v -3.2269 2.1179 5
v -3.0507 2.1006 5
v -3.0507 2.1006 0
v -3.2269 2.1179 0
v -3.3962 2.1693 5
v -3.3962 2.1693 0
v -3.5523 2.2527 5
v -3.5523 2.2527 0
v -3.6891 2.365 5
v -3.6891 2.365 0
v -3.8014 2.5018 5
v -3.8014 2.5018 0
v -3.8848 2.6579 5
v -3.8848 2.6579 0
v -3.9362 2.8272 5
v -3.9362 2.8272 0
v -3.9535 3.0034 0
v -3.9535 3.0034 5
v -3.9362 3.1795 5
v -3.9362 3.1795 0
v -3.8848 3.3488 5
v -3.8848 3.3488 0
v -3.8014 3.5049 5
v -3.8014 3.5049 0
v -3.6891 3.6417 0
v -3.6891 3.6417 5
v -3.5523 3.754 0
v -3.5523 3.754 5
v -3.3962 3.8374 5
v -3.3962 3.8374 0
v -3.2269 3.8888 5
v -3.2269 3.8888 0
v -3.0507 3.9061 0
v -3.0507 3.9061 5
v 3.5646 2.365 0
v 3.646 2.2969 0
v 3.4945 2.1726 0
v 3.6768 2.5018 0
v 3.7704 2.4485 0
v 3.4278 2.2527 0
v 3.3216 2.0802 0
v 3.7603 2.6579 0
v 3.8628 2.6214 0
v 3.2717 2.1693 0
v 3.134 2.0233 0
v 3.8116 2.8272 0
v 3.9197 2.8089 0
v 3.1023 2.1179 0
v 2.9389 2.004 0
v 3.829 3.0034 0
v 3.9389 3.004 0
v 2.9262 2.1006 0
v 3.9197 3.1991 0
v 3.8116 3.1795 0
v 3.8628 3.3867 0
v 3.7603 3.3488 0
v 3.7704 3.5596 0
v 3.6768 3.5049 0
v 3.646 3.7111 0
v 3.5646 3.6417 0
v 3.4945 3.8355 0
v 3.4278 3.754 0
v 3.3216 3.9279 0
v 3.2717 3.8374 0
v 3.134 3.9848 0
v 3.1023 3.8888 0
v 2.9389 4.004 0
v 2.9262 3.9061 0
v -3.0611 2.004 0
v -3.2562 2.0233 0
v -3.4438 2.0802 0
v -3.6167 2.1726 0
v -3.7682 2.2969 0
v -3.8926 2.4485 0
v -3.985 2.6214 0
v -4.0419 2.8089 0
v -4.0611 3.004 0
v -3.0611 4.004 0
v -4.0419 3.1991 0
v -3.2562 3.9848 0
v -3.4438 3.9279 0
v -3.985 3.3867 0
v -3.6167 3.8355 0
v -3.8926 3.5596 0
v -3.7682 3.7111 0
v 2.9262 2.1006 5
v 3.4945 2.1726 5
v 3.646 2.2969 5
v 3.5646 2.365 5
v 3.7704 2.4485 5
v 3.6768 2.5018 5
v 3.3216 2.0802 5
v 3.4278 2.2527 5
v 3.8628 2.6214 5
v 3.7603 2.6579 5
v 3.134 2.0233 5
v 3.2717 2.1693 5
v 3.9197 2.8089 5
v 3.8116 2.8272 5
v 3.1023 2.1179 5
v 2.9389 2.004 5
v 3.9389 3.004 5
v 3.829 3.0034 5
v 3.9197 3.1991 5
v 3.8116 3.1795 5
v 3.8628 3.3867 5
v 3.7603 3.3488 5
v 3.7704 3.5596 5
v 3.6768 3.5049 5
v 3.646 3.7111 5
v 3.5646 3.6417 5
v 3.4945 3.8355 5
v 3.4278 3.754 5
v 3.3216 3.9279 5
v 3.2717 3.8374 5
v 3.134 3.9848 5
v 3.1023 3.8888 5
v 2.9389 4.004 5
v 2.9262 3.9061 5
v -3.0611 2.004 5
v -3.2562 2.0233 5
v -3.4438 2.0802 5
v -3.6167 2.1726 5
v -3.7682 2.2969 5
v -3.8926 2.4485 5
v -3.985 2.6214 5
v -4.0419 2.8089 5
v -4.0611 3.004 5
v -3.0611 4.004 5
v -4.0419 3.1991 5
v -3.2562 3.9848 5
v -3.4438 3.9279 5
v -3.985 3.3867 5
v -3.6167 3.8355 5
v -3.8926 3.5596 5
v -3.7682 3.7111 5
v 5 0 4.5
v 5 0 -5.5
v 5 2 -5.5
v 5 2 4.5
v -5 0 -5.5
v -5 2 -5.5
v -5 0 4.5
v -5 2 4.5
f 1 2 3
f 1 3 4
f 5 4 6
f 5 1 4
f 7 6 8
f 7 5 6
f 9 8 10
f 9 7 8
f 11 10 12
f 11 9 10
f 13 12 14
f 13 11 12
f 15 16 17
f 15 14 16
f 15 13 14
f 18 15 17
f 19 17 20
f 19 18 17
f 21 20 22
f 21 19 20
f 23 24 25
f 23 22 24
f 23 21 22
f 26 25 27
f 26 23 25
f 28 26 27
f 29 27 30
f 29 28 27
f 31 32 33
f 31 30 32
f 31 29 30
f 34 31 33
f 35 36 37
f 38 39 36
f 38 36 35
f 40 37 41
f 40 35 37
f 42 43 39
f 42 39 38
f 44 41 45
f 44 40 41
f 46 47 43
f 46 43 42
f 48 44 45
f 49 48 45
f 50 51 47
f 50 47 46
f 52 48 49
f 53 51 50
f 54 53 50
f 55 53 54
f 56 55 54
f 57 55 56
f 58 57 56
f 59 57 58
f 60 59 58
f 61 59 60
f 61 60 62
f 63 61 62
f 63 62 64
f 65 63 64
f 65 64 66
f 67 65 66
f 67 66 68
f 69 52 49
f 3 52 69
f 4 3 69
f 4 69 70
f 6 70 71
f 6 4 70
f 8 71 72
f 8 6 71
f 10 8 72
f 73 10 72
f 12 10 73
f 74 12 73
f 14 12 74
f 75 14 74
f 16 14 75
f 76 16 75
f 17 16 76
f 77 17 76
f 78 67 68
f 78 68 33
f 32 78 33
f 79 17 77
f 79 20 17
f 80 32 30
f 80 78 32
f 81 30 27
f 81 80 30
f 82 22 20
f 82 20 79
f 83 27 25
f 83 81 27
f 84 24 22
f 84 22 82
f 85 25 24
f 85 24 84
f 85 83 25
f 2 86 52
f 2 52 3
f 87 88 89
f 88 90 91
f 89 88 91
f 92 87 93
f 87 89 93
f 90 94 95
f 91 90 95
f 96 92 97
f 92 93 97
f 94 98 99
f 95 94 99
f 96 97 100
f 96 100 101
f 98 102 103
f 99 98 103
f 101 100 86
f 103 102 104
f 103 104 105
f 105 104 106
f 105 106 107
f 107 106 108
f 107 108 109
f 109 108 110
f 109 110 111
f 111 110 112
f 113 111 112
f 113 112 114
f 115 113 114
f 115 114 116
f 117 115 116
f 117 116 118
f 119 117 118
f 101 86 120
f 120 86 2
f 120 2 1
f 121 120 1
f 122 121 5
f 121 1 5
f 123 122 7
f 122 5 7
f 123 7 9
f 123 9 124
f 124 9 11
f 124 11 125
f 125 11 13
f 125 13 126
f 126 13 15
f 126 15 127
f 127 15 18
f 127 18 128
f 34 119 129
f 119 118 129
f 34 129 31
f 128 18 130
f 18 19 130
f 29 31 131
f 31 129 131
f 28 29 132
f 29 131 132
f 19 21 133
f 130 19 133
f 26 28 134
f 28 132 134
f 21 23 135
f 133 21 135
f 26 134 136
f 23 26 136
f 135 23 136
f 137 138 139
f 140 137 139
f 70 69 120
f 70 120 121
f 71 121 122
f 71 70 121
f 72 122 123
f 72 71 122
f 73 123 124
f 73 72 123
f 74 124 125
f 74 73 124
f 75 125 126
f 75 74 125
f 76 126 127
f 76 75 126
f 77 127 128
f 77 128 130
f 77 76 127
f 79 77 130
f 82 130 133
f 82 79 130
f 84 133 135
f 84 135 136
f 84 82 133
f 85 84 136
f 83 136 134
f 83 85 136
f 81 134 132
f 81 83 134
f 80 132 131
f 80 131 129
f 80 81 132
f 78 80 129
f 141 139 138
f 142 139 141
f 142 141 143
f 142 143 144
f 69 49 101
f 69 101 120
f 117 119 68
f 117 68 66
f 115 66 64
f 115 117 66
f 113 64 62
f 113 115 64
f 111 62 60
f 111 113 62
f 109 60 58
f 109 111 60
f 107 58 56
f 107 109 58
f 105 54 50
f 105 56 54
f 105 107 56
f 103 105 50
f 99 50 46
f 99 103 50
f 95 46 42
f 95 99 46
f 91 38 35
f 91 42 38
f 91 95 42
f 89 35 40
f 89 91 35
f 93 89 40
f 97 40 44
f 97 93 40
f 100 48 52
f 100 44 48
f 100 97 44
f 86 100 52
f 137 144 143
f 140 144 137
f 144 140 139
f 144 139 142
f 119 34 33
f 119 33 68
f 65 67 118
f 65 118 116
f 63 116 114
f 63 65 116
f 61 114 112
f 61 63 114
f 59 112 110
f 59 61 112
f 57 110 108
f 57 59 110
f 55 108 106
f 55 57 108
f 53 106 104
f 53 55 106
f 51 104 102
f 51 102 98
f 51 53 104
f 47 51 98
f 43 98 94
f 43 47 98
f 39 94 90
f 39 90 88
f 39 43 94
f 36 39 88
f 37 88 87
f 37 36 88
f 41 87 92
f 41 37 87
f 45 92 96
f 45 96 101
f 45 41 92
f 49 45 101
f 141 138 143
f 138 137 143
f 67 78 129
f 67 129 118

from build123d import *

# Parameters (mm, degrees)
SKETCH_1_W          = 10
SKETCH_1_H          = 13
EXTRUDE_1_DEPTH     = 2
EXTRUDE_3_DEPTH     = 5
CUT_EXTRUDE_1_DEPTH = 14.163674016
SKETCH_10_W         = 10
SKETCH_10_H         = 2
CUT_EXTRUDE_2_DEPTH = 2
SKETCH_11_W         = 10
SKETCH_11_H         = 2
CUT_EXTRUDE_3_DEPTH = 2
SKETCH_12_W         = 10
SKETCH_12_H         = 2
EXTRUDE_4_DEPTH     = 1


with BuildPart() as part:
    # 草图1 → 凸台-拉伸1 (new body)
    with BuildSketch(Plane(origin=(0, 0, 0), x_dir=(1, 0, 0), z_dir=(0, 1, 0))):
        Rectangle(SKETCH_1_W, SKETCH_1_H)
    extrude(amount=EXTRUDE_1_DEPTH)

    # 草图10 → 切除-拉伸2 (cut)
    with BuildSketch(Plane.XY.offset(6.5)):
        with Locations((0, 1)):
            Rectangle(SKETCH_10_W, SKETCH_10_H)
    extrude(amount=-CUT_EXTRUDE_2_DEPTH, mode=Mode.SUBTRACT)

    # 草图11 → 切除-拉伸3 (cut)
    with BuildSketch(Plane(origin=(0, 0, -6.5), x_dir=(-1, 0, 0), z_dir=(0, 0, -1))):
        with Locations((0, 1)):
            Rectangle(SKETCH_11_W, SKETCH_11_H)
    extrude(amount=-CUT_EXTRUDE_3_DEPTH, mode=Mode.SUBTRACT)

    # 草图12 → 凸台-拉伸4 (add)
    with BuildSketch(Plane(origin=(0, 0, -4.5), x_dir=(-1, 0, 0), z_dir=(0, 0, -1))):
        with Locations((0, 1)):
            Rectangle(SKETCH_12_W, SKETCH_12_H)
    extrude(amount=EXTRUDE_4_DEPTH)


with BuildPart() as body_2:
    # 草图2 → 凸台-拉伸3 (new body)
    with BuildSketch(Plane.XY):
        with BuildLine():
            Line((-3.061108679, 4.004037161), (2.938891321, 4.004037161))
            ThreePointArc((2.938891321, 4.004037161), (3.938891321, 3.004037161), (2.938891321, 2.004037161))
            Line((2.938891321, 2.004037161), (-3.061108679, 2.004037161))
            ThreePointArc((-3.061108679, 2.004037161), (-4.061108679, 3.004037161), (-3.061108679, 4.004037161))
        make_face()
    extrude(amount=EXTRUDE_3_DEPTH)

    # 草图5 → 切除-拉伸1 (cut, through all)
    with BuildSketch(Plane.XY.offset(5)):
        with BuildLine():
            Line((-3.050732039, 3.906131945), (2.926212364, 3.906131945))
            ThreePointArc((2.926212364, 3.906131945), (3.828980009, 3.003364301), (2.926212364, 2.100596657))
            Line((2.926212364, 2.100596657), (-3.050732039, 2.100596657))
            ThreePointArc((-3.050732039, 2.100596657), (-3.953499684, 3.003364301), (-3.050732039, 3.906131945))
        make_face()
    extrude(amount=-CUT_EXTRUDE_1_DEPTH, mode=Mode.SUBTRACT)


solid = Compound([part.part, body_2.part])
